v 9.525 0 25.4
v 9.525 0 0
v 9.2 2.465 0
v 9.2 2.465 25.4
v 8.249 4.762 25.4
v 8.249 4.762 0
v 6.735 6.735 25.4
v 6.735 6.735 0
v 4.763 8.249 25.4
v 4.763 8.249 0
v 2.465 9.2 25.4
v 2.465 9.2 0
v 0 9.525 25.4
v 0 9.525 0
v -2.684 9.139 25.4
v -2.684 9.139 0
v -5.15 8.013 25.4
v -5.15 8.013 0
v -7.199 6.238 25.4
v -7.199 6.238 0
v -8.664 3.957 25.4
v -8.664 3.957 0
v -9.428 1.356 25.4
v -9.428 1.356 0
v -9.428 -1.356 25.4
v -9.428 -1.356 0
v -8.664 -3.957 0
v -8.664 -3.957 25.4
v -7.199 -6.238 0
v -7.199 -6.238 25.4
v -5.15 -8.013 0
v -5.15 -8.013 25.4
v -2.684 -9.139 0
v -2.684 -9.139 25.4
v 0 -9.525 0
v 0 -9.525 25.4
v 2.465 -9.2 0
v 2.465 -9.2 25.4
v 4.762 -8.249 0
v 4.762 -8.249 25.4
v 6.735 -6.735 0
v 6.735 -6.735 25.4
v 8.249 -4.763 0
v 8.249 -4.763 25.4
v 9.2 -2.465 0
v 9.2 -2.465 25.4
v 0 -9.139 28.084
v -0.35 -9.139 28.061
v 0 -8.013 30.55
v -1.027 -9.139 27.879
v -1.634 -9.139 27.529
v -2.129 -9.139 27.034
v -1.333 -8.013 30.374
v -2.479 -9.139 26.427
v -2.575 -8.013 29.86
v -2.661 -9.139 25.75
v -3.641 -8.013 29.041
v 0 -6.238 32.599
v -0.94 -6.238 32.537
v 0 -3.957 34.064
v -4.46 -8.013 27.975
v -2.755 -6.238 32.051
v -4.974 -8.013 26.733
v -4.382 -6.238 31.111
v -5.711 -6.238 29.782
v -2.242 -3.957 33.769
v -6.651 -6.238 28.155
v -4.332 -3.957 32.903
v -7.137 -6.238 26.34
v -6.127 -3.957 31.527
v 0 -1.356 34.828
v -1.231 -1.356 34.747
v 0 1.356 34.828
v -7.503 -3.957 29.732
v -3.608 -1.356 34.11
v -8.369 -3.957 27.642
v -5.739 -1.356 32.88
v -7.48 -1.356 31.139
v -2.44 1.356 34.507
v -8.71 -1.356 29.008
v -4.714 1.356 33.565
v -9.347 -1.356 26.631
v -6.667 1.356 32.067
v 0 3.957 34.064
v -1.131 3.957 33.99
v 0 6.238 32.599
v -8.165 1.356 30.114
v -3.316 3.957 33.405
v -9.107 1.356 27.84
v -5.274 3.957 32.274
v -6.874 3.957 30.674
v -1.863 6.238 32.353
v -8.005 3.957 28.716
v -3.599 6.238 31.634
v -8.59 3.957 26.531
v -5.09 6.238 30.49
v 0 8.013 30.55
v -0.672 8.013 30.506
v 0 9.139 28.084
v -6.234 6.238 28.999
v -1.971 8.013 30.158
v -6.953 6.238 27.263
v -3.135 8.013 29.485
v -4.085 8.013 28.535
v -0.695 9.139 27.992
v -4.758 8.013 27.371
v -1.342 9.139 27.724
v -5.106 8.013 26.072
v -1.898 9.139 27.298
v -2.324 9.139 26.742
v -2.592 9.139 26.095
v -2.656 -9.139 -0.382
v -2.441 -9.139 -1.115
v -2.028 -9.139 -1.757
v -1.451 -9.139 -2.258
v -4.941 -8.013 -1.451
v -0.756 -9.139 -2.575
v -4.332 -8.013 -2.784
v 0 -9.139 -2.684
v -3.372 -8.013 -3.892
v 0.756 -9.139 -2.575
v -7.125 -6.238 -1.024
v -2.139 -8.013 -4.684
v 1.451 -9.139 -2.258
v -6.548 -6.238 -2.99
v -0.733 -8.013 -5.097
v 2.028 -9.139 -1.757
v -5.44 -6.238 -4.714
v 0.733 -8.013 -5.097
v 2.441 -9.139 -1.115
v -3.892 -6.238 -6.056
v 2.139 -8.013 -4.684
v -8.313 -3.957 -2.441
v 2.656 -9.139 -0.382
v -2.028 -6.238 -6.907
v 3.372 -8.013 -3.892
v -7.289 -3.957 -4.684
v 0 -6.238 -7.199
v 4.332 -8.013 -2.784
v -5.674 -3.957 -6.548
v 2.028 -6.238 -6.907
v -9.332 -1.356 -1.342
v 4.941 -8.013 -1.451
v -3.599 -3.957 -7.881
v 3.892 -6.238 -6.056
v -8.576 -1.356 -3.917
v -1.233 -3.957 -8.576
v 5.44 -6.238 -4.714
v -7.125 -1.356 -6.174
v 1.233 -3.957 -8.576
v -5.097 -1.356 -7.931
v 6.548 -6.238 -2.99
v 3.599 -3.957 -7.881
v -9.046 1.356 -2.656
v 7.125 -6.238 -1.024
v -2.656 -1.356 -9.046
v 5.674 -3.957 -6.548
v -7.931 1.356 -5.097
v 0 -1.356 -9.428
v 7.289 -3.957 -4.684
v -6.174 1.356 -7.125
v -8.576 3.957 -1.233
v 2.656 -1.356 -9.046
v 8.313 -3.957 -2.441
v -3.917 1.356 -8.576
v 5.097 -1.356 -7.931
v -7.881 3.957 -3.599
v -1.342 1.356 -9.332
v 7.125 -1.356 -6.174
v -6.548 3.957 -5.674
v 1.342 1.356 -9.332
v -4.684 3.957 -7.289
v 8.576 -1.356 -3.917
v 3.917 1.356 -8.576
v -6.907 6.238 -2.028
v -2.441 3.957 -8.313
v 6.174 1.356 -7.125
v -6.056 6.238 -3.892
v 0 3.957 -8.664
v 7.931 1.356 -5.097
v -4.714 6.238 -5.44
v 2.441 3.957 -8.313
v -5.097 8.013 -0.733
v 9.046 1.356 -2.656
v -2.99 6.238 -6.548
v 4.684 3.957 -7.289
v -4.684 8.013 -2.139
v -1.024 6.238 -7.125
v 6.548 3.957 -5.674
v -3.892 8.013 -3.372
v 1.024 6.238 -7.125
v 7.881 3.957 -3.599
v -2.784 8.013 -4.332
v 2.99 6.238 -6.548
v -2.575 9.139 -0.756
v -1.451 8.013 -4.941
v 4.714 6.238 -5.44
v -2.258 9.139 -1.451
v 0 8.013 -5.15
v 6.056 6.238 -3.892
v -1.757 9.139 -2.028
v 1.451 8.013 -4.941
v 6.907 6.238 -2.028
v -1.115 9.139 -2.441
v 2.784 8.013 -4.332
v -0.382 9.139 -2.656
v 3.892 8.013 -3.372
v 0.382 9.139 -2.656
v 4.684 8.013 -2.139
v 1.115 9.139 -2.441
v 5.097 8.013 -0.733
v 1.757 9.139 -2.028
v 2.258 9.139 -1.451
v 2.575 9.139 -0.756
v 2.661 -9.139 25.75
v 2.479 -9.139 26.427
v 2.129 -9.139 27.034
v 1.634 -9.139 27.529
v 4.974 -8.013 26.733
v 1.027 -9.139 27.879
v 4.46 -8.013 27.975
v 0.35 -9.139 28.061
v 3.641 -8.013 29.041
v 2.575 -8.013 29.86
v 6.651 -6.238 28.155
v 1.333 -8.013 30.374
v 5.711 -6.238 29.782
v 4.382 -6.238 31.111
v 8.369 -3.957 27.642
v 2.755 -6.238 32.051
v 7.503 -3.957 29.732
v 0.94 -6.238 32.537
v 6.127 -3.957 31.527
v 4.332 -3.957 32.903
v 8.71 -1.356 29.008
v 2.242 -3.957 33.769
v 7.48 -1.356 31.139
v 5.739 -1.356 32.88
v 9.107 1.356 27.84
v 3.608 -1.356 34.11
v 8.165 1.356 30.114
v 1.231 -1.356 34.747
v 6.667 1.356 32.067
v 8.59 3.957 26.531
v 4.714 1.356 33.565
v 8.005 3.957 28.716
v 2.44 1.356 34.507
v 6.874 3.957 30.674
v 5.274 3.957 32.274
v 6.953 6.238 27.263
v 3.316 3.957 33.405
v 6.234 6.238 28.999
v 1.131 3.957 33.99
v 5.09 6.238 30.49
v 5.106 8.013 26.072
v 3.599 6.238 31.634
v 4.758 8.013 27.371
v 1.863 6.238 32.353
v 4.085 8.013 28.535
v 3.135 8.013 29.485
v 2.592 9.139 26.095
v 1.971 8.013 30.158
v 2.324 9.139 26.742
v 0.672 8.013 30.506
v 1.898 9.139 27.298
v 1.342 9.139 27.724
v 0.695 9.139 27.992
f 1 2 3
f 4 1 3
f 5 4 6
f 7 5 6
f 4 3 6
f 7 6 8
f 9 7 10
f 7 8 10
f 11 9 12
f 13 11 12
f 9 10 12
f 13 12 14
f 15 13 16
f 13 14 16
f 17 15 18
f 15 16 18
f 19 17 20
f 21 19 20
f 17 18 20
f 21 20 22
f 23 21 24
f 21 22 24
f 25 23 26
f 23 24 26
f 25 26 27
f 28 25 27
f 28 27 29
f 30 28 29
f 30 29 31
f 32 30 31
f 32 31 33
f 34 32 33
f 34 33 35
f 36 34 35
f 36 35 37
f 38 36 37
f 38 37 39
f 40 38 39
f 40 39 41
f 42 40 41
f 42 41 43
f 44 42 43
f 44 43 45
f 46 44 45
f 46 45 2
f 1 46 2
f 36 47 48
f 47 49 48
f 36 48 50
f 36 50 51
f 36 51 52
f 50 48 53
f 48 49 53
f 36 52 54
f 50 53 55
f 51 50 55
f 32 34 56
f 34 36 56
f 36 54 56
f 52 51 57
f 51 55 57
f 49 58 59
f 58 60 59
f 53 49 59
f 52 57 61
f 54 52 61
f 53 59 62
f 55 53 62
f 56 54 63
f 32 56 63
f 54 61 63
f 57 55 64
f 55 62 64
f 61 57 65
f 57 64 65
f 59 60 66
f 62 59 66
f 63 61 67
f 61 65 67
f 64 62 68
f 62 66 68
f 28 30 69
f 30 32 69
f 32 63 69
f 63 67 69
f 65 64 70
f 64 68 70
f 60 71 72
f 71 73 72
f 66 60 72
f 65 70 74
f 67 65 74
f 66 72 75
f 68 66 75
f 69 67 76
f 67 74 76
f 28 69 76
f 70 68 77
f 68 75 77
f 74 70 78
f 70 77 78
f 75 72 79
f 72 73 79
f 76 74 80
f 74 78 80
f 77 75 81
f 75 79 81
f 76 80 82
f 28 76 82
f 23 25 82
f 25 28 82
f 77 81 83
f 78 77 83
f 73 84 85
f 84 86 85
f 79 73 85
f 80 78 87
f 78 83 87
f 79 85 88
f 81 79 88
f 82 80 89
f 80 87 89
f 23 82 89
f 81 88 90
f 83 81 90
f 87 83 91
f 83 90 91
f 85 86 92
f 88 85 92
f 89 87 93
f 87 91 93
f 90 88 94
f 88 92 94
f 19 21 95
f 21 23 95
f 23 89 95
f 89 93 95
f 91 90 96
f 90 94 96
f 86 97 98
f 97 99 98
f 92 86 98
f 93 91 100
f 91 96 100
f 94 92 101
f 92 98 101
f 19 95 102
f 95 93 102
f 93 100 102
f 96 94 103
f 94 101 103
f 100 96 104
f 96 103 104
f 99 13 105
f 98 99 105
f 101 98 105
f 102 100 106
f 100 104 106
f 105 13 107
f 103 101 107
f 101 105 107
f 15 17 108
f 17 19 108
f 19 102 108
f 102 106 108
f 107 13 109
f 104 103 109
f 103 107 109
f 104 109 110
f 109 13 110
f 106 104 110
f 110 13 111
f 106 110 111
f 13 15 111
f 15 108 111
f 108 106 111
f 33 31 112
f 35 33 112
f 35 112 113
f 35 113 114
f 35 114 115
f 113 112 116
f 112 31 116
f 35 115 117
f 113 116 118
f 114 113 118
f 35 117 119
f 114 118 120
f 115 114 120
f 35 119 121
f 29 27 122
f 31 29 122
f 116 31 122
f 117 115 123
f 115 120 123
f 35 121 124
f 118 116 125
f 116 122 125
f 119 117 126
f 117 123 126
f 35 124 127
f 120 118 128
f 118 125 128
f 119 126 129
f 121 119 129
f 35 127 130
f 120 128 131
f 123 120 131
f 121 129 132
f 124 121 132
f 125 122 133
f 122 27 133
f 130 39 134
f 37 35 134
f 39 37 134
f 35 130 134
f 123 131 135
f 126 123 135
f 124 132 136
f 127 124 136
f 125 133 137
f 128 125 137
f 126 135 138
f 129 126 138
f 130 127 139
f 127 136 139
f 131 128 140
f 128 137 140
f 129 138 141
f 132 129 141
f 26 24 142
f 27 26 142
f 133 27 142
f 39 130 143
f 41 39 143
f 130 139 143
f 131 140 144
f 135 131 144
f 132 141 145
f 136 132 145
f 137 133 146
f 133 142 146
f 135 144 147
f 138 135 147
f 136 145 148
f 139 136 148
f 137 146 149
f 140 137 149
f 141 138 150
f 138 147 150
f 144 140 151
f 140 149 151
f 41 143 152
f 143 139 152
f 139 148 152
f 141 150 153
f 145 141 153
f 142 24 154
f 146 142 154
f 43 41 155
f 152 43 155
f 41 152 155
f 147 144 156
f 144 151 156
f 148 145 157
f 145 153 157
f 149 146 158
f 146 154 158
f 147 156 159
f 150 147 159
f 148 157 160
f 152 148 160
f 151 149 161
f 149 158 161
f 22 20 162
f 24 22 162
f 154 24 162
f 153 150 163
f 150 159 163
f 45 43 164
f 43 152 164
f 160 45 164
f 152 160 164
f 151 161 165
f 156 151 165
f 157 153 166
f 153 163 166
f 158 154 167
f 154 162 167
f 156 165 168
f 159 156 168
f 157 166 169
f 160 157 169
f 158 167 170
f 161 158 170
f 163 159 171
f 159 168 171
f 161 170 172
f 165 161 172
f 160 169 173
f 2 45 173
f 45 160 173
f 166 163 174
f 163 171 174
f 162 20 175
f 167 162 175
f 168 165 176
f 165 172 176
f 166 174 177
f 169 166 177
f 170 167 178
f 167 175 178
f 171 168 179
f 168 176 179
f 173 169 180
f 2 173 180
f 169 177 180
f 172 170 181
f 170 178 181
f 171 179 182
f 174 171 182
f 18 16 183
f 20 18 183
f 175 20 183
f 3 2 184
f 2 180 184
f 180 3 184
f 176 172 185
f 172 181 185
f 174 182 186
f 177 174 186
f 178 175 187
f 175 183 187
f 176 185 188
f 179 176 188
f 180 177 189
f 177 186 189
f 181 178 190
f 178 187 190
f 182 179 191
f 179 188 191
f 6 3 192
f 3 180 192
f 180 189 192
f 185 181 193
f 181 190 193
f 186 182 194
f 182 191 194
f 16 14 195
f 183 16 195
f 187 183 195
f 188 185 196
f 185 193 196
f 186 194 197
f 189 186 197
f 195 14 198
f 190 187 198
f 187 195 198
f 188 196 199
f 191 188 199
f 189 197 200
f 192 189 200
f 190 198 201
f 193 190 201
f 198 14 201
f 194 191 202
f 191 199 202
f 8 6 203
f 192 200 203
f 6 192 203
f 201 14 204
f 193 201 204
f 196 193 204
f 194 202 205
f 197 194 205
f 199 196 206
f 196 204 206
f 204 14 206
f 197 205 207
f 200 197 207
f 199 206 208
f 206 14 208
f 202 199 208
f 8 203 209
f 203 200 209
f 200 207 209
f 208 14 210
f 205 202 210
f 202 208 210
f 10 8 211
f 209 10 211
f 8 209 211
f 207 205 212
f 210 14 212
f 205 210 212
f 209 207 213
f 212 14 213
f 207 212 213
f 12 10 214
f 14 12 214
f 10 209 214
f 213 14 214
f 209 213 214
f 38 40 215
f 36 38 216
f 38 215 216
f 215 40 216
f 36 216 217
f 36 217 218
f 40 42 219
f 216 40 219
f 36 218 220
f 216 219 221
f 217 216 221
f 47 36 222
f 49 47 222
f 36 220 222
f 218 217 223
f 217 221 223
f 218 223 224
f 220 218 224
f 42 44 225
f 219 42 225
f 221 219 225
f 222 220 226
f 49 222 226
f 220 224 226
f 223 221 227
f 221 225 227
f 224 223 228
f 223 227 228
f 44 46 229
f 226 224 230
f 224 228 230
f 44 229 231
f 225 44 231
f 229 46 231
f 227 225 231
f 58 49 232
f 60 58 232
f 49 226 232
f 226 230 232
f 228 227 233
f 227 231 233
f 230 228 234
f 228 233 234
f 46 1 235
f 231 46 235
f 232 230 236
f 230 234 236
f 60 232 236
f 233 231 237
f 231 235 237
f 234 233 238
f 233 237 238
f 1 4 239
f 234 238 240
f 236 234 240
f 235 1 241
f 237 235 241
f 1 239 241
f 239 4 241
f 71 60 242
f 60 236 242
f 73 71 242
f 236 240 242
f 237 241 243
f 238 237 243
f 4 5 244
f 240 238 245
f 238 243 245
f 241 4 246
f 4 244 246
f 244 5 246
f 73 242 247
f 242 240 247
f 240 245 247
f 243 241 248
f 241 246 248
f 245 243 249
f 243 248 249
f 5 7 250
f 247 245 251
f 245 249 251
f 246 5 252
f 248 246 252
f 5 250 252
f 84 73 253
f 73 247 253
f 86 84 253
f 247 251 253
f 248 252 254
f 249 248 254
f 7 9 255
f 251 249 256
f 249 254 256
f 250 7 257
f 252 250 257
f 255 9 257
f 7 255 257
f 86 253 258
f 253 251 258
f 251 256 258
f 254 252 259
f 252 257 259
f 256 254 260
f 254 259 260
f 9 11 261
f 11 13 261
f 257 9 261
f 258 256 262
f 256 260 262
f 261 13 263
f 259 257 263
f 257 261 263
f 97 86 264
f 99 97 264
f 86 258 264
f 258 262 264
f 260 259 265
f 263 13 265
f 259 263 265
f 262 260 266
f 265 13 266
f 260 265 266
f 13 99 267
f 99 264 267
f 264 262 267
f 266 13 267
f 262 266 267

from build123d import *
from build123d.topology import SkipClean

# Parameters (mm, degrees)
SKETCH1_R           = 9.525
BOSS_EXTRUDE1_DEPTH = 25.4


with BuildPart() as part:
    # Sketch1 → Boss-Extrude1 (new body)
    with BuildSketch(Plane.XY):
        Circle(SKETCH1_R)
    extrude(amount=BOSS_EXTRUDE1_DEPTH)

    # Sketch2 → Revolve1 (revolve)
    with BuildSketch(Plane(origin=(0, 0, 0), x_dir=(0, 0, -1), z_dir=(1, 0, 0))):
        with BuildLine():
            Line((0, 9.525), (0, -9.525))
            ThreePointArc((0, -9.525), (9.525, 0), (0, 9.525))
        make_face()
    revolve(axis=Axis((0, 9.525, 0), (0, -1, 0)))

    # Sketch3 → Revolve2 (revolve)
    with SkipClean():  # the faces are left unmerged after this step: merging them gives an invalid solid
        with BuildSketch(Plane(origin=(0, 0, 0), x_dir=(0, 0, -1), z_dir=(1, 0, 0))):
            with BuildLine():
                Line((-25.4, 9.525), (-25.4, -9.525))
                ThreePointArc((-25.4, -9.525), (-34.925, 0), (-25.4, 9.525))
            make_face()
        revolve(axis=Axis((0, 9.525, 25.4), (0, -1, 0)))


solid = part.part
